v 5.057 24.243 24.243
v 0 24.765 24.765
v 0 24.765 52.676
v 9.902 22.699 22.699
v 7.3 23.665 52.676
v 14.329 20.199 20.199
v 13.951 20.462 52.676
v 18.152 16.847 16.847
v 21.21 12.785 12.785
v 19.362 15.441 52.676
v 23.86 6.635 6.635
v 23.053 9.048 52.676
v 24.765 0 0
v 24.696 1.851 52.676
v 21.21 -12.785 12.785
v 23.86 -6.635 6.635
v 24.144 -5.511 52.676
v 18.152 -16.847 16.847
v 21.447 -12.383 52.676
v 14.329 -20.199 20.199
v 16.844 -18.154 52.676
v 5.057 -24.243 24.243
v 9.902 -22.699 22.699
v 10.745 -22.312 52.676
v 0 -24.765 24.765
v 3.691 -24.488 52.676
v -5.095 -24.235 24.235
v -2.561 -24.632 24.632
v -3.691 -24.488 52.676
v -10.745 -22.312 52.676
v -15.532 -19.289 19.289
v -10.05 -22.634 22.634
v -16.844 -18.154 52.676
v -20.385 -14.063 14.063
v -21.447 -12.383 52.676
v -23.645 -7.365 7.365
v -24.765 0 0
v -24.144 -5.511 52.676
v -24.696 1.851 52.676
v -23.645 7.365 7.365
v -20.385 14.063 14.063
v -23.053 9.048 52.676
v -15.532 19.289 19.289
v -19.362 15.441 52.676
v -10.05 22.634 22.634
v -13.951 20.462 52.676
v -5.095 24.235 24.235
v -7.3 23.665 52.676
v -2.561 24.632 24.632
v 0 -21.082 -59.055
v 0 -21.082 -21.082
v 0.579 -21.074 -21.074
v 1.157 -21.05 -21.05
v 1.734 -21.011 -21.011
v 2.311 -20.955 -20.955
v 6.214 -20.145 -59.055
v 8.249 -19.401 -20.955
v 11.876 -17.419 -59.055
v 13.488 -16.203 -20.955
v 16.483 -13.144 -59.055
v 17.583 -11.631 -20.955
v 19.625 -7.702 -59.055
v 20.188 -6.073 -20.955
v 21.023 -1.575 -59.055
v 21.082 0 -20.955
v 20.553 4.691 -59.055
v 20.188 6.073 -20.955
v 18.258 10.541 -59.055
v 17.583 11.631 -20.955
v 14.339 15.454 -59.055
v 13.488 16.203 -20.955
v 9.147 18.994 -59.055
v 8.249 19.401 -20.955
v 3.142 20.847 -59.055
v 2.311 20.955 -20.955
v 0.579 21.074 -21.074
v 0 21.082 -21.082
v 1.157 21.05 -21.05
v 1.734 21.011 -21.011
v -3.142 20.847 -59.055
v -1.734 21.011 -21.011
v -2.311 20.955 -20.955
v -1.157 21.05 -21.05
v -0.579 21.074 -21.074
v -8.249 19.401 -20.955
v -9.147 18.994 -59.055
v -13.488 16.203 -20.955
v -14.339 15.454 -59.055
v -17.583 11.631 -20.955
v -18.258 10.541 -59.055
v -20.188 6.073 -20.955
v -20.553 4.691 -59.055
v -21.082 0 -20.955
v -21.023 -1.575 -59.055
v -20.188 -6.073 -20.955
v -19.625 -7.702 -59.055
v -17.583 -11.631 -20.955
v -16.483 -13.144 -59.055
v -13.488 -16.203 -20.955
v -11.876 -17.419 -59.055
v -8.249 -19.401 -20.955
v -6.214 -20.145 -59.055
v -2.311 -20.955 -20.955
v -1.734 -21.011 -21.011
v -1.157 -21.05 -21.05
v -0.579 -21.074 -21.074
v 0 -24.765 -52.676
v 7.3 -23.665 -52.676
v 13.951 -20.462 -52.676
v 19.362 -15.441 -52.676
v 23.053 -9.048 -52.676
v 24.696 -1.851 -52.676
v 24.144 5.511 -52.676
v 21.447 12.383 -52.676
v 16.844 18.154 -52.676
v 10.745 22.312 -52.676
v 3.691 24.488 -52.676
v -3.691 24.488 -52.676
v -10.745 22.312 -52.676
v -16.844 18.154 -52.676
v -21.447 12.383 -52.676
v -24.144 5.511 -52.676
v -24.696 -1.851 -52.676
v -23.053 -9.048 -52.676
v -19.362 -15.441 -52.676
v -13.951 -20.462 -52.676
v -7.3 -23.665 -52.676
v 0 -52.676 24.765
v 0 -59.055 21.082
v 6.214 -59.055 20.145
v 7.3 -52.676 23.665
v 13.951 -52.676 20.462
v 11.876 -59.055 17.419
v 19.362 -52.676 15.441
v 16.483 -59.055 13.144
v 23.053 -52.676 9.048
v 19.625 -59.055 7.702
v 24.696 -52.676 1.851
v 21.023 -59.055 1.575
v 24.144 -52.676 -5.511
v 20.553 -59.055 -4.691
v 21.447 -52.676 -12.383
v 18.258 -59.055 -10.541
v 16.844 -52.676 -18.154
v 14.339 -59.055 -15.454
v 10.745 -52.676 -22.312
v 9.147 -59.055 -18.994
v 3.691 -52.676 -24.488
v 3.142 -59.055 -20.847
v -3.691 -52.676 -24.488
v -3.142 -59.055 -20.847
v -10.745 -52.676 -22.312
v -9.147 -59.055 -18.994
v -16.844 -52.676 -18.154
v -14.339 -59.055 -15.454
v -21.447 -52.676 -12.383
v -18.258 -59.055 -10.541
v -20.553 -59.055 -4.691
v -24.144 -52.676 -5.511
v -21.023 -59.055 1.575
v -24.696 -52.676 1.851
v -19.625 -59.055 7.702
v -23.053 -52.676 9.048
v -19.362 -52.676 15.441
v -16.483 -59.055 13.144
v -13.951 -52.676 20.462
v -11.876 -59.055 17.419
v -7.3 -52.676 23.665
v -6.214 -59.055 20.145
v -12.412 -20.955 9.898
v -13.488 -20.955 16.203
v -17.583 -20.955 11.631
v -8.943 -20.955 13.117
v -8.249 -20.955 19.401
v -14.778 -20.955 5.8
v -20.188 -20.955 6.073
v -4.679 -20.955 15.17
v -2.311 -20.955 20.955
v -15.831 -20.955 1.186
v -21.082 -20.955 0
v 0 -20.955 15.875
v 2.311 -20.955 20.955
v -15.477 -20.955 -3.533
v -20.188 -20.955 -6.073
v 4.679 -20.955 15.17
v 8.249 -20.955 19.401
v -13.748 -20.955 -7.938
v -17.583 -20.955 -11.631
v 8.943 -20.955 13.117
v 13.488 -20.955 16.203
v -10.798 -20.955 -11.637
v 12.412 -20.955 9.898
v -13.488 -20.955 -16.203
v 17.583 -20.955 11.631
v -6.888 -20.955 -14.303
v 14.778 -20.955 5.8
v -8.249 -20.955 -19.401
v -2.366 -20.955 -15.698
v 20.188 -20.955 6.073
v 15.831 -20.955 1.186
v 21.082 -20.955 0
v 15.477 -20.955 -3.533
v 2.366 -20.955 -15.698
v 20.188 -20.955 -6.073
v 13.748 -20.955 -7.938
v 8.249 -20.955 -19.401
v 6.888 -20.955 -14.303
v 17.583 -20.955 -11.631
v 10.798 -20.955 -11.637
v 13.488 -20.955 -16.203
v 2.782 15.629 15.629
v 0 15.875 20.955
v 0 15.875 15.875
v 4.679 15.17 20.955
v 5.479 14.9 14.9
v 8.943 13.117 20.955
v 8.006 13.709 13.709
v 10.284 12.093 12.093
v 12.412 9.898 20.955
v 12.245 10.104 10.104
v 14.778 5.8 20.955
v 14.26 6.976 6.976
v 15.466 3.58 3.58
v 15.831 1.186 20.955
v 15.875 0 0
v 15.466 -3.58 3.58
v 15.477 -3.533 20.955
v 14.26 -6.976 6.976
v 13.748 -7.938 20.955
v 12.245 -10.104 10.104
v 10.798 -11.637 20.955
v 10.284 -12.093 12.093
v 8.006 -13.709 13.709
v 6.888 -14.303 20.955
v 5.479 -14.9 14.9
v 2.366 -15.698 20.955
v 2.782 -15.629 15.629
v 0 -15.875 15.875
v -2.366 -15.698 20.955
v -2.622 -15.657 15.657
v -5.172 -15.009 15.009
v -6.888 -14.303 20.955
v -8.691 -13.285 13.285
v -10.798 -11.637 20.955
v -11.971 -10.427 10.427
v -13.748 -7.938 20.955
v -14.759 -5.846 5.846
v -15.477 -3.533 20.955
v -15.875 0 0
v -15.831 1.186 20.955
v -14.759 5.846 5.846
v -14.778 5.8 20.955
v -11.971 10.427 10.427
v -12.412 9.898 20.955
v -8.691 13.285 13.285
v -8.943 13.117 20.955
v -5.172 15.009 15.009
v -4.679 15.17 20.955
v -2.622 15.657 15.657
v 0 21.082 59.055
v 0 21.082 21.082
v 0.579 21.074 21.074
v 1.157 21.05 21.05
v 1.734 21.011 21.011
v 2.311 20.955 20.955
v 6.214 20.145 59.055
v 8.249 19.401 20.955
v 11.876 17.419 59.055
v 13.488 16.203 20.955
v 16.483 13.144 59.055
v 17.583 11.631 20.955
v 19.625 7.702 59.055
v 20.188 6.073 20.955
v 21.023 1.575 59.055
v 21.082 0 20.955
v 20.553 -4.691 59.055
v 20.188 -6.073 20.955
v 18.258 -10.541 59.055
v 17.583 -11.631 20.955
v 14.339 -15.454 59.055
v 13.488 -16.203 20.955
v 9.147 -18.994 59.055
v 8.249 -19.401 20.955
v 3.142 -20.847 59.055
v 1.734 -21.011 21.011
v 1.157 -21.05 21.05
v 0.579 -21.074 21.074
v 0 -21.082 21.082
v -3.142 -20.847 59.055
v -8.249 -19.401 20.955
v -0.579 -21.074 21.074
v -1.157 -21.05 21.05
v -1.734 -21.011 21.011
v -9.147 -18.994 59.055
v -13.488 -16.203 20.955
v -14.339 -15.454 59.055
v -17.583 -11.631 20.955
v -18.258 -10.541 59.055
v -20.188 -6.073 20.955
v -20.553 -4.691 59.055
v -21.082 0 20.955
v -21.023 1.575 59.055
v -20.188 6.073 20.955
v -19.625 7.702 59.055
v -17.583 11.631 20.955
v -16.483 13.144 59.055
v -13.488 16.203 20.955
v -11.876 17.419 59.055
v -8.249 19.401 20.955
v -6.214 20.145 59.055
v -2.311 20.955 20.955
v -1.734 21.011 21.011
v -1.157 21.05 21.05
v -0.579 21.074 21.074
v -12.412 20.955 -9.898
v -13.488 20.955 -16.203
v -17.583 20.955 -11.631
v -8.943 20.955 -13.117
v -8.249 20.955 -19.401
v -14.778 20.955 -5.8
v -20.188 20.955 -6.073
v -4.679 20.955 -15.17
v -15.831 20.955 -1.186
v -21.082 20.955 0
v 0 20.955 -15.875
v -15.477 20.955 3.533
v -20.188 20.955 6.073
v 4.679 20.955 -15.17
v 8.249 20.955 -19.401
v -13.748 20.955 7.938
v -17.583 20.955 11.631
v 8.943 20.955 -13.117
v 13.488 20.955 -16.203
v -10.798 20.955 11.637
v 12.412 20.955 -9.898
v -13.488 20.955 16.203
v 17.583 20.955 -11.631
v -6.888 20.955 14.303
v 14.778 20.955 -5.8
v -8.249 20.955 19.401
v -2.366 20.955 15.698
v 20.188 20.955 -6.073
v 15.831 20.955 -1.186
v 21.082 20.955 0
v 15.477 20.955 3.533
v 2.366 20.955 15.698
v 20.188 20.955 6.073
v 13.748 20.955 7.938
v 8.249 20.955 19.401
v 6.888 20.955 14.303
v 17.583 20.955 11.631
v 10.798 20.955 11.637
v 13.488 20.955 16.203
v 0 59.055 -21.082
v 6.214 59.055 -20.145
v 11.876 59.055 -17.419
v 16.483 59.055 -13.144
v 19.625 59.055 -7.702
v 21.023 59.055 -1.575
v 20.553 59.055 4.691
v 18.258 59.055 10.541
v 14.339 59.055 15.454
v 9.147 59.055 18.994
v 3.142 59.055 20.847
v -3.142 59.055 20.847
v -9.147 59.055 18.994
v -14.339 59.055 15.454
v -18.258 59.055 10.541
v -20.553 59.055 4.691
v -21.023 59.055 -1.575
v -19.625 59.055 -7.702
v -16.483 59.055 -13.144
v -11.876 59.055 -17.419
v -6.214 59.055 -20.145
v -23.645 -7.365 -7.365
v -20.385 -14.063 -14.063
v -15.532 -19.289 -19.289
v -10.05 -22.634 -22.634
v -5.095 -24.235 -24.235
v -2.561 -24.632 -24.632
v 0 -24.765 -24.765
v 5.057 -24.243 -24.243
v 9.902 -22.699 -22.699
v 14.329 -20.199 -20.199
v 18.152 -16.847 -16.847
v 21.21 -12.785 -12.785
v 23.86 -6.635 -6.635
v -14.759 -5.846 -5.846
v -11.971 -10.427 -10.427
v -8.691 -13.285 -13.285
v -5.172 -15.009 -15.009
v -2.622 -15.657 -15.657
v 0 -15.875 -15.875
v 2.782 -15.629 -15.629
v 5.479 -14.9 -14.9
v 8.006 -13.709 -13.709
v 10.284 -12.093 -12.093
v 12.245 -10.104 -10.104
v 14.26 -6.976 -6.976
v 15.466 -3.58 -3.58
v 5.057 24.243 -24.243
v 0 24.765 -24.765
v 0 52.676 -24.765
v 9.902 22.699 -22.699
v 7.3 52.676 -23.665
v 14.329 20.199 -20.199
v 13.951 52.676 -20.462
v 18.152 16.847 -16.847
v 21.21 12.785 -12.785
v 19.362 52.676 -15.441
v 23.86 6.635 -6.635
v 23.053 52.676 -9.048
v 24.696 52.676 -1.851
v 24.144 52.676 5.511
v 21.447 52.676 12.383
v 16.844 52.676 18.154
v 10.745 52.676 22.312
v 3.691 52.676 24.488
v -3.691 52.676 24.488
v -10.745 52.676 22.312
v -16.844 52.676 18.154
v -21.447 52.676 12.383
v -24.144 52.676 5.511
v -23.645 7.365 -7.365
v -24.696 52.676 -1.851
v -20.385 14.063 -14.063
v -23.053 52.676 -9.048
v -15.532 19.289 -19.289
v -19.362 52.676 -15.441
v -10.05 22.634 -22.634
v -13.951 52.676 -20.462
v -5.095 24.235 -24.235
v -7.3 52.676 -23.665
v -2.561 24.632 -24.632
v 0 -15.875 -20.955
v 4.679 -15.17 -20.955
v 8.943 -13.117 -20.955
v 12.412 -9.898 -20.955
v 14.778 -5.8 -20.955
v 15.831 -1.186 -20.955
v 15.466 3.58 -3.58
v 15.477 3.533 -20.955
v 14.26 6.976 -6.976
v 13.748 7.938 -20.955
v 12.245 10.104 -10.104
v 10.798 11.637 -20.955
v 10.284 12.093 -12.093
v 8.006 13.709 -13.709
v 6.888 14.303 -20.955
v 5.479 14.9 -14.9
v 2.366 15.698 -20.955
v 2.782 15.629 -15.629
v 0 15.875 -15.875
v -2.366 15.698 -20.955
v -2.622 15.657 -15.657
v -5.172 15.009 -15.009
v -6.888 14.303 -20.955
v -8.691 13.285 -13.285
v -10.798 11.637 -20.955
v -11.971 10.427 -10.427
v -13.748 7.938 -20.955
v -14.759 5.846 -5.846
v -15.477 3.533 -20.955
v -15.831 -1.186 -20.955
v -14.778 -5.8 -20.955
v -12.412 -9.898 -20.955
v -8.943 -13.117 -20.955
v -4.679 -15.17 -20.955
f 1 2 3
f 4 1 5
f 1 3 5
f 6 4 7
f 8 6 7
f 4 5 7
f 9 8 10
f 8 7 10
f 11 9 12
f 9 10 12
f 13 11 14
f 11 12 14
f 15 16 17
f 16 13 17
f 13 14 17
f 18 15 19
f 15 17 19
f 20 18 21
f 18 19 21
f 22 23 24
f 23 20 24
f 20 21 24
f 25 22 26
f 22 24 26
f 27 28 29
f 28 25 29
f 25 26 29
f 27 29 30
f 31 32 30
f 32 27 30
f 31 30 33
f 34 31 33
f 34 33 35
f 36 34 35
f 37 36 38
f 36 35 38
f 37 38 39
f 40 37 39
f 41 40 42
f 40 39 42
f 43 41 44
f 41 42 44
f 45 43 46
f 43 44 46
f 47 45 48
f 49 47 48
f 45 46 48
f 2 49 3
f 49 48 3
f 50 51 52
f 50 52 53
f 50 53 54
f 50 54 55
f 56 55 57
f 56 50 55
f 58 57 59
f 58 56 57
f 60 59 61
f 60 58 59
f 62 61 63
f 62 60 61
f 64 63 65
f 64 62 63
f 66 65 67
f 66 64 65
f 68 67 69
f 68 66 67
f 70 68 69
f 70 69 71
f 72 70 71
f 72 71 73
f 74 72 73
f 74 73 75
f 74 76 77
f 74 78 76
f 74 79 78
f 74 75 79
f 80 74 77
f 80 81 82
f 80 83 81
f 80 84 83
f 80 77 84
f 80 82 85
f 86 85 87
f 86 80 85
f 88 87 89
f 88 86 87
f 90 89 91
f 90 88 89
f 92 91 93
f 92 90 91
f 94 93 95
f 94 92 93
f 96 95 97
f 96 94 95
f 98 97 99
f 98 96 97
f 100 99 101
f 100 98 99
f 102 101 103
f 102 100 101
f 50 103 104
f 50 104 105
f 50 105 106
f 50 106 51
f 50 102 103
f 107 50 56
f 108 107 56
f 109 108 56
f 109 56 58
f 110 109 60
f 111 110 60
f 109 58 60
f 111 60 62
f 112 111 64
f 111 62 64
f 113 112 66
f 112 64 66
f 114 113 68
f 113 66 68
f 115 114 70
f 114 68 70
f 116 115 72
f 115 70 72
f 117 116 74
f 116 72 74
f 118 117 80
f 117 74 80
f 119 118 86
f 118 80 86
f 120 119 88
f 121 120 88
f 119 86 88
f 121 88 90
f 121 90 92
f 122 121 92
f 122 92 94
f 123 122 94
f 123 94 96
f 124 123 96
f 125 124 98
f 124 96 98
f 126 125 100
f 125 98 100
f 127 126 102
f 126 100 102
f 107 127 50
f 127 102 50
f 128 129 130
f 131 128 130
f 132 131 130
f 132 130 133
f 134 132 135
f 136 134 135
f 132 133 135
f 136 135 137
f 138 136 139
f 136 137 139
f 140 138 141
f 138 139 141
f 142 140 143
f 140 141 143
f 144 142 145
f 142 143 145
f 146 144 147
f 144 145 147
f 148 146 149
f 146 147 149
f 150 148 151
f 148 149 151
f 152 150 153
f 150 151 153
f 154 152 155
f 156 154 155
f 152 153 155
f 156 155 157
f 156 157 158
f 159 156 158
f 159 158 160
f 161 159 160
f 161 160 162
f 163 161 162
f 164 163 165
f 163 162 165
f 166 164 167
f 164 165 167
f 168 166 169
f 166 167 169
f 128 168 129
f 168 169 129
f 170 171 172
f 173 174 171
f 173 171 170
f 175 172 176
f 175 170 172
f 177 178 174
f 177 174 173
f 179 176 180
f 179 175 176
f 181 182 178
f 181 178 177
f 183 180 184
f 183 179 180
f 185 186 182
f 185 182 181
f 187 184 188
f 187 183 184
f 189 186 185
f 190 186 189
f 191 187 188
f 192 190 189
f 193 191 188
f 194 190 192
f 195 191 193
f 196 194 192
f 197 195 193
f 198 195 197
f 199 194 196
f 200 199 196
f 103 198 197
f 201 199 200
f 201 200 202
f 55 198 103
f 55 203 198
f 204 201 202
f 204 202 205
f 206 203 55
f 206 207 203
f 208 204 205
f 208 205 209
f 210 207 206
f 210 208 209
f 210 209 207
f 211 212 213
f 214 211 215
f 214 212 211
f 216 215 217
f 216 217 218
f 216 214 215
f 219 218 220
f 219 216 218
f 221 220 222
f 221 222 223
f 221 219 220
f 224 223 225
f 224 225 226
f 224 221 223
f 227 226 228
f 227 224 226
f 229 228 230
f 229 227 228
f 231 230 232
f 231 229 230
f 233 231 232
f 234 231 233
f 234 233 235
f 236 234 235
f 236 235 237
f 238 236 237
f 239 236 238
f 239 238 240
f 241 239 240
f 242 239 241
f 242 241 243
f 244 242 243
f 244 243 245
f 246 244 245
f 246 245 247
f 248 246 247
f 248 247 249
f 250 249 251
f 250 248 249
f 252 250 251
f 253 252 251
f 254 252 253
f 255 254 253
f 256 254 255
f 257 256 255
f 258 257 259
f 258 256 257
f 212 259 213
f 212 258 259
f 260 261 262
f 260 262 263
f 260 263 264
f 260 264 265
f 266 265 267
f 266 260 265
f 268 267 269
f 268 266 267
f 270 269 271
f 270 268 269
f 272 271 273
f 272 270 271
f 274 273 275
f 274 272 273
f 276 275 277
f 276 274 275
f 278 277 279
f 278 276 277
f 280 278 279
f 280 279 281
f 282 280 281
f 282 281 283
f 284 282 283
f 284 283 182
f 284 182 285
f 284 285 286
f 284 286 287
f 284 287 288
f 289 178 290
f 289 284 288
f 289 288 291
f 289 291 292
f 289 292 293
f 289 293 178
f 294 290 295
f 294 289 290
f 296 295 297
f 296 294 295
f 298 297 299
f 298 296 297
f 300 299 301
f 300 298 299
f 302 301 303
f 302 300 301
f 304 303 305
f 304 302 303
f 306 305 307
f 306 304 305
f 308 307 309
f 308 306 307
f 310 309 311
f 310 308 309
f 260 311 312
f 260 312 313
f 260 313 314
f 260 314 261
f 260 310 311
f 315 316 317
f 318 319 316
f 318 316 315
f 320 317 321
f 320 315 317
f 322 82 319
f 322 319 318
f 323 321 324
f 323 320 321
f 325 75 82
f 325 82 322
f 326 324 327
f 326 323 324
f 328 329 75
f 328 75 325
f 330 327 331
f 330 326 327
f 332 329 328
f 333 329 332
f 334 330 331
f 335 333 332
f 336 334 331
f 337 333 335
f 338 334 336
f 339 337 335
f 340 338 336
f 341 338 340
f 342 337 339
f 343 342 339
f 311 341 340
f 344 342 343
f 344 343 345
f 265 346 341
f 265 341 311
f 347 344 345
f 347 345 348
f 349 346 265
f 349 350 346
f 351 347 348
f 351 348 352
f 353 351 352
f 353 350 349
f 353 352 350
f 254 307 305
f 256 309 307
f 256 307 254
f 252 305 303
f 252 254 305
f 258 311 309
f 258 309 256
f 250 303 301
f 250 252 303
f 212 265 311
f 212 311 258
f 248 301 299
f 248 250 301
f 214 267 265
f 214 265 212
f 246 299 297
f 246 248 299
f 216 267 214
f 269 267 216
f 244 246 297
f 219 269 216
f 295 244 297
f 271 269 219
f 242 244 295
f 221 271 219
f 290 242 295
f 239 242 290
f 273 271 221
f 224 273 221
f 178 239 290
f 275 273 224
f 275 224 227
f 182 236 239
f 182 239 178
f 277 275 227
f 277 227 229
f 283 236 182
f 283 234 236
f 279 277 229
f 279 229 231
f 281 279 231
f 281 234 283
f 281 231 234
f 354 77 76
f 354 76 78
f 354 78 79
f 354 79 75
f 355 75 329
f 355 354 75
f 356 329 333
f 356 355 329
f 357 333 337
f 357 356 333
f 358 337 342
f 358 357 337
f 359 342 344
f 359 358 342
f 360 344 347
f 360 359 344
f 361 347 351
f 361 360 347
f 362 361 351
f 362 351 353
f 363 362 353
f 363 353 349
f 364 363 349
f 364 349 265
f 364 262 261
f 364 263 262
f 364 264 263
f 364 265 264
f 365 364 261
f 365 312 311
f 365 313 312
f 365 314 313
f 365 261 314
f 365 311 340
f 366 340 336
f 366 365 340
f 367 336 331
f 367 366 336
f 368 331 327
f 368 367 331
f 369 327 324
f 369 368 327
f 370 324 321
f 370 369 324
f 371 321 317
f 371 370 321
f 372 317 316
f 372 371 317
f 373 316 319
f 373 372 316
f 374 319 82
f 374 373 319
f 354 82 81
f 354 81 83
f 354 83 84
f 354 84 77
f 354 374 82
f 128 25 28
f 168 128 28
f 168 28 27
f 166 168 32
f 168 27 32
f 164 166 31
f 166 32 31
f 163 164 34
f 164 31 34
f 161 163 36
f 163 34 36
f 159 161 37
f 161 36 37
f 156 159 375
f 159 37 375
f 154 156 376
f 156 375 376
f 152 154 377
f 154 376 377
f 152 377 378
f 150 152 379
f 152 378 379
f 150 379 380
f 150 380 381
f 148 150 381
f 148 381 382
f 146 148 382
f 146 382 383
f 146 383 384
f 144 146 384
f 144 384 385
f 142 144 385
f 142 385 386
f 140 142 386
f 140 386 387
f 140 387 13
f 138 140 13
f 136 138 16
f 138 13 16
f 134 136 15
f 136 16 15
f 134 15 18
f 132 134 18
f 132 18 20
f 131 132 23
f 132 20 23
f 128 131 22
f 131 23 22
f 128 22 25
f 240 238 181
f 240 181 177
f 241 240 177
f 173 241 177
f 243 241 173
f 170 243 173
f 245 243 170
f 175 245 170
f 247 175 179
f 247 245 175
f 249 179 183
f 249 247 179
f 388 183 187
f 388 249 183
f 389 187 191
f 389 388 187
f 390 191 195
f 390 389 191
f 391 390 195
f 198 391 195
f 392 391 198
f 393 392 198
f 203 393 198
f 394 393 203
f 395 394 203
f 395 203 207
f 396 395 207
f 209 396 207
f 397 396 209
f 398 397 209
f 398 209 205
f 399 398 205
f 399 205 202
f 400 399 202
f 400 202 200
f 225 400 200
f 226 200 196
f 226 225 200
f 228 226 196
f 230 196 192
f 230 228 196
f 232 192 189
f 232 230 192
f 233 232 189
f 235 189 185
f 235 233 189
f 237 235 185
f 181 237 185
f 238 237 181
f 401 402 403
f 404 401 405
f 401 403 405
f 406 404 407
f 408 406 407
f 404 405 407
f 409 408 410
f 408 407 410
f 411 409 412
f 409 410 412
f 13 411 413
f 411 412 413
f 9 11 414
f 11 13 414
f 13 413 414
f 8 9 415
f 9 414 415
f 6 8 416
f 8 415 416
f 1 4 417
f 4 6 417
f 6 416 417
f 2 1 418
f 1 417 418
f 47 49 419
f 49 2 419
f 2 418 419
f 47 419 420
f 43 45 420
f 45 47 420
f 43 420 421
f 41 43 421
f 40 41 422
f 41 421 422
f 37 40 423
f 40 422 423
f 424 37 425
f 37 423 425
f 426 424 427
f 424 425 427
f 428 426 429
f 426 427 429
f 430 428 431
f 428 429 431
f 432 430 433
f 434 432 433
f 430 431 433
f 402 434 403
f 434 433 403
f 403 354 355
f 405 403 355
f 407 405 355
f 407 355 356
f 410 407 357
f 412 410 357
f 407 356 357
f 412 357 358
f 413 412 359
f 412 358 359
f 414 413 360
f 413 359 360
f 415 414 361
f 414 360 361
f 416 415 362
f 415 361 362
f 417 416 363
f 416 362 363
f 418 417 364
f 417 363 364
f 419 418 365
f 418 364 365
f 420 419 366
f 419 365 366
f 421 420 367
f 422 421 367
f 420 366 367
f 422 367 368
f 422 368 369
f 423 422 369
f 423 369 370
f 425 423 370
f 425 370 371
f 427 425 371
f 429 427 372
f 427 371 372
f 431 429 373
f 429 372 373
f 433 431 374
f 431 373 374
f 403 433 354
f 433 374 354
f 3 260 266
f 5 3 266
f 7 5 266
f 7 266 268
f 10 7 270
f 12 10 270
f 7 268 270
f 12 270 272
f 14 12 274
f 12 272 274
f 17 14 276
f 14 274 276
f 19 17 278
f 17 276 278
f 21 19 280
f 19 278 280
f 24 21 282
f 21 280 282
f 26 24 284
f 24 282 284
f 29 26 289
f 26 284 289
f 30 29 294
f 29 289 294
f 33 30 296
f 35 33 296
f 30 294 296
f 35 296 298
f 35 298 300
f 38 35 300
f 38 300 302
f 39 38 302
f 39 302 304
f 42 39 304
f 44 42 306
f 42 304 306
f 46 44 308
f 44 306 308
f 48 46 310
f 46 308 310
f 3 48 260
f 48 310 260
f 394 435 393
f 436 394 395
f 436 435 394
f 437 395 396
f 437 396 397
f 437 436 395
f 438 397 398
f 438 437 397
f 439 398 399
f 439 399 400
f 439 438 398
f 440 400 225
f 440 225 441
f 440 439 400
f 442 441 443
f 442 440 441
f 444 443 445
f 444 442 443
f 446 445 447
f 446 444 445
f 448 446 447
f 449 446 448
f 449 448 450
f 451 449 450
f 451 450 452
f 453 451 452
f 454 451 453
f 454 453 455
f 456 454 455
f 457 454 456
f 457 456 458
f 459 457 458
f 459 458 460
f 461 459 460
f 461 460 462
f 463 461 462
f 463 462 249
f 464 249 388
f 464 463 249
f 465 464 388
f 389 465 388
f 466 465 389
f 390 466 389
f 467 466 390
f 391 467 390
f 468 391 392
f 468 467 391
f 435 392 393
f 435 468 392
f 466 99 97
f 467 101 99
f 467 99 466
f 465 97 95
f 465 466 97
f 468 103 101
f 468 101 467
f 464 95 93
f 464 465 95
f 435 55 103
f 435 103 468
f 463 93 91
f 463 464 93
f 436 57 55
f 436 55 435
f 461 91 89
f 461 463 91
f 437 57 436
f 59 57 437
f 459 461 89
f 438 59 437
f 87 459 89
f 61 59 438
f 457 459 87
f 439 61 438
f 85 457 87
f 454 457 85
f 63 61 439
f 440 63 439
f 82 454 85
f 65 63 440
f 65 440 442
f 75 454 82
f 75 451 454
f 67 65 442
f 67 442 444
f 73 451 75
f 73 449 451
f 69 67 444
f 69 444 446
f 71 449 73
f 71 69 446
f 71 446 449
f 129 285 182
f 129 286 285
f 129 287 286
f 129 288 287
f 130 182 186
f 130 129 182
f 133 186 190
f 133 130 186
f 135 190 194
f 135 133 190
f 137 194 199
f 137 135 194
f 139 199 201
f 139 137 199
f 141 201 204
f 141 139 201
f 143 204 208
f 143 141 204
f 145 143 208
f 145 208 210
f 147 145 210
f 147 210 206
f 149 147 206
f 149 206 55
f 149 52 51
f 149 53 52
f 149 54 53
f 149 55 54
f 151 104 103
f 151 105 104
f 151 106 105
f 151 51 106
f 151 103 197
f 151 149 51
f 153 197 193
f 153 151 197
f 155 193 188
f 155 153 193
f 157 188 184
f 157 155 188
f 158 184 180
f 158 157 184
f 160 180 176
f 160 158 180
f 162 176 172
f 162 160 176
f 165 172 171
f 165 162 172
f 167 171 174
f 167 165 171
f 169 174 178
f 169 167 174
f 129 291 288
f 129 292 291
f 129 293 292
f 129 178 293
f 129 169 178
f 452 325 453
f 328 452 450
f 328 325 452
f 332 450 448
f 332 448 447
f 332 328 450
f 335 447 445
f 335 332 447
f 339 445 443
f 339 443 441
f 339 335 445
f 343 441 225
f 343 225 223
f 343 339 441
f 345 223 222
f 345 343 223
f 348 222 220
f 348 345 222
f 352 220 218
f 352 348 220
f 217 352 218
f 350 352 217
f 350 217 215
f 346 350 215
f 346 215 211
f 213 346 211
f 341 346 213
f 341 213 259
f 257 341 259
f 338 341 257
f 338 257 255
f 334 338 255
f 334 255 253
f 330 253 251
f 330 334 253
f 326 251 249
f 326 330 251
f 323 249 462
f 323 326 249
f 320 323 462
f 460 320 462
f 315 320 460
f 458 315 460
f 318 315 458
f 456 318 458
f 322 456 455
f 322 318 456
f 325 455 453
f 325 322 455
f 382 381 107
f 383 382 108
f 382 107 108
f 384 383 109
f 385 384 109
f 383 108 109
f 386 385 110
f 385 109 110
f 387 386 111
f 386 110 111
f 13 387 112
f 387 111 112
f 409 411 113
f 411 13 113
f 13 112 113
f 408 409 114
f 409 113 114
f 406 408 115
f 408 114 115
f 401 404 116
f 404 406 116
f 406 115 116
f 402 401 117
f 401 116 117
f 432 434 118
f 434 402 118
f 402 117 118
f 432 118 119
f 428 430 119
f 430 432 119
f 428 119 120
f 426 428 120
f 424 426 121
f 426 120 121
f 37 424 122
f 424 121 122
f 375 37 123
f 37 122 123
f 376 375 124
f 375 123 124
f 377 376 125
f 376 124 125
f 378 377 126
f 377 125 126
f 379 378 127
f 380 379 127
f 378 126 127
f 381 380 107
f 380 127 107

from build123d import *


with BuildPart() as f4:
    # F0 (on Right) → F4 (revolve)
    with BuildSketch(Plane.YZ):
        with BuildLine():
            Line((-52.6758568757, 24.765), (-59.055, 21.082))
            Line((-59.055, 21.082), (-20.955, 21.082))
            Line((-20.955, 21.082), (-20.955, 15.875))
            Line((-20.955, 15.875), (0, 15.875))
            ThreePointArc((0, 15.875), (11.2253201513, 11.2253201513), (15.875, 0))
            Line((15.875, 0), (24.765, 0))
            ThreePointArc((24.765, 0), (17.5114994361, 17.5114994361), (0, 24.765))
            Line((0, 24.765), (-52.6758568757, 24.765))
        make_face()
        with BuildLine():
            Line((-20.955, 21.082), (-59.055, 21.082))
            Line((-59.055, 21.082), (-59.055, 0))
            Line((-59.055, 0), (0, 0))
            Line((0, 0), (10.5189766587, 0))
            Line((10.5189766587, 0), (15.875, 0))
            ThreePointArc((15.875, 0), (11.2253201513, 11.2253201513), (0, 15.875))
            Line((0, 15.875), (-20.955, 15.875))
            Line((-20.955, 15.875), (-20.955, 21.082))
        make_face()
    revolve(axis=Axis((0, -21.59, 0), (0, 1, 0)))

    # F1 (on Right) → F5 (revolve)
    with BuildSketch(Plane.YZ):
        with BuildLine():
            Line((-24.765, -52.6758568757), (-21.082, -59.055))
            Line((-21.082, -59.055), (-21.082, -20.955))
            Line((-21.082, -20.955), (-15.875, -20.955))
            Line((-15.875, -20.955), (-15.875, 0))
            ThreePointArc((-15.875, 0), (-11.2253201513, 11.2253201513), (0, 15.875))
            Line((0, 15.875), (0, 24.765))
            ThreePointArc((0, 24.765), (-17.5114994361, 17.5114994361), (-24.765, 0))
            Line((-24.765, 0), (-24.765, -52.6758568757))
        make_face()
        with BuildLine():
            Line((-21.082, -20.955), (-21.082, -59.055))
            Line((-21.082, -59.055), (0, -59.055))
            Line((0, -59.055), (0, 0))
            Line((0, 0), (0, 15.875))
            ThreePointArc((0, 15.875), (-11.2253201513, 11.2253201513), (-15.875, 0))
            Line((-15.875, 0), (-15.875, -20.955))
            Line((-15.875, -20.955), (-21.082, -20.955))
        make_face()
    revolve(axis=Axis((0, 0, -21.59), (0, 0, 1)))

    # F2 (on Right) → F6 (revolve)
    with BuildSketch(Plane.YZ):
        with BuildLine():
            Line((52.6758568757, -24.765), (59.055, -21.082))
            Line((59.055, -21.082), (20.955, -21.082))
            Line((20.955, -21.082), (20.955, -15.875))
            Line((20.955, -15.875), (0, -15.875))
            ThreePointArc((0, -15.875), (-11.2253201513, -11.2253201513), (-15.875, 0))
            Line((-15.875, 0), (-24.765, 0))
            ThreePointArc((-24.765, 0), (-17.5114994361, -17.5114994361), (0, -24.765))
            Line((0, -24.765), (52.6758568757, -24.765))
        make_face()
        with BuildLine():
            Line((20.955, -21.082), (59.055, -21.082))
            Line((59.055, -21.082), (59.055, 0))
            Line((59.055, 0), (10.5189766587, 0))
            Line((10.5189766587, 0), (0, 0))
            Line((0, 0), (-15.875, 0))
            ThreePointArc((-15.875, 0), (-11.2253201513, -11.2253201513), (0, -15.875))
            Line((0, -15.875), (20.955, -15.875))
            Line((20.955, -15.875), (20.955, -21.082))
        make_face()
    revolve(axis=Axis((0, 21.59, 0), (0, -1, 0)))

    # F3 (on Right) → F7 (revolve)
    with BuildSketch(Plane.YZ):
        with BuildLine():
            Line((24.765, 52.6758568757), (21.082, 59.055))
            Line((21.082, 59.055), (21.082, 20.955))
            Line((21.082, 20.955), (15.875, 20.955))
            Line((15.875, 20.955), (15.875, 0))
            ThreePointArc((15.875, 0), (11.2253201513, -11.2253201513), (0, -15.875))
            Line((0, -15.875), (0, -24.765))
            ThreePointArc((0, -24.765), (17.5114994361, -17.5114994361), (24.765, 0))
            Line((24.765, 0), (24.765, 52.6758568757))
        make_face()
        with BuildLine():
            Line((21.082, 20.955), (21.082, 59.055))
            Line((21.082, 59.055), (0, 59.055))
            Line((0, 59.055), (0, 9.2996467855))
            Line((0, 9.2996467855), (0, 0))
            Line((0, 0), (0, -15.875))
            ThreePointArc((0, -15.875), (11.2253201513, -11.2253201513), (15.875, 0))
            Line((15.875, 0), (15.875, 20.955))
            Line((15.875, 20.955), (21.082, 20.955))
        make_face()
    revolve(axis=Axis((0, 0, 21.59), (0, 0, -1)))

    # F0 (on Right) → F8 (revolve, cut)
    with BuildSketch(Plane.YZ):
        with BuildLine():
            Line((-20.955, 21.082), (-59.055, 21.082))
            Line((-59.055, 21.082), (-59.055, 0))
            Line((-59.055, 0), (0, 0))
            Line((0, 0), (10.5189766587, 0))
            Line((10.5189766587, 0), (15.875, 0))
            ThreePointArc((15.875, 0), (11.2253201513, 11.2253201513), (0, 15.875))
            Line((0, 15.875), (-20.955, 15.875))
            Line((-20.955, 15.875), (-20.955, 21.082))
        make_face()
    revolve(axis=Axis((0, -21.59, 0), (0, 1, 0)), mode=Mode.SUBTRACT)

    # F1 (on Right) → F9 (revolve, cut)
    with BuildSketch(Plane.YZ):
        with BuildLine():
            Line((-21.082, -20.955), (-21.082, -59.055))
            Line((-21.082, -59.055), (0, -59.055))
            Line((0, -59.055), (0, 0))
            Line((0, 0), (0, 15.875))
            ThreePointArc((0, 15.875), (-11.2253201513, 11.2253201513), (-15.875, 0))
            Line((-15.875, 0), (-15.875, -20.955))
            Line((-15.875, -20.955), (-21.082, -20.955))
        make_face()
    revolve(axis=Axis((0, 0, -21.59), (0, 0, 1)), mode=Mode.SUBTRACT)

    # F2 (on Right) → F10 (revolve, cut)
    with BuildSketch(Plane.YZ):
        with BuildLine():
            Line((20.955, -21.082), (59.055, -21.082))
            Line((59.055, -21.082), (59.055, 0))
            Line((59.055, 0), (10.5189766587, 0))
            Line((10.5189766587, 0), (0, 0))
            Line((0, 0), (-15.875, 0))
            ThreePointArc((-15.875, 0), (-11.2253201513, -11.2253201513), (0, -15.875))
            Line((0, -15.875), (20.955, -15.875))
            Line((20.955, -15.875), (20.955, -21.082))
        make_face()
    revolve(axis=Axis((0, 21.59, 0), (0, -1, 0)), mode=Mode.SUBTRACT)

    # F3 (on Right) → F11 (revolve, cut)
    with BuildSketch(Plane.YZ):
        with BuildLine():
            Line((21.082, 20.955), (21.082, 59.055))
            Line((21.082, 59.055), (0, 59.055))
            Line((0, 59.055), (0, 9.2996467855))
            Line((0, 9.2996467855), (0, 0))
            Line((0, 0), (0, -15.875))
            ThreePointArc((0, -15.875), (11.2253201513, -11.2253201513), (15.875, 0))
            Line((15.875, 0), (15.875, 20.955))
            Line((15.875, 20.955), (21.082, 20.955))
        make_face()
    revolve(axis=Axis((0, 0, 21.59), (0, 0, -1)), mode=Mode.SUBTRACT)


solid = f4.part
